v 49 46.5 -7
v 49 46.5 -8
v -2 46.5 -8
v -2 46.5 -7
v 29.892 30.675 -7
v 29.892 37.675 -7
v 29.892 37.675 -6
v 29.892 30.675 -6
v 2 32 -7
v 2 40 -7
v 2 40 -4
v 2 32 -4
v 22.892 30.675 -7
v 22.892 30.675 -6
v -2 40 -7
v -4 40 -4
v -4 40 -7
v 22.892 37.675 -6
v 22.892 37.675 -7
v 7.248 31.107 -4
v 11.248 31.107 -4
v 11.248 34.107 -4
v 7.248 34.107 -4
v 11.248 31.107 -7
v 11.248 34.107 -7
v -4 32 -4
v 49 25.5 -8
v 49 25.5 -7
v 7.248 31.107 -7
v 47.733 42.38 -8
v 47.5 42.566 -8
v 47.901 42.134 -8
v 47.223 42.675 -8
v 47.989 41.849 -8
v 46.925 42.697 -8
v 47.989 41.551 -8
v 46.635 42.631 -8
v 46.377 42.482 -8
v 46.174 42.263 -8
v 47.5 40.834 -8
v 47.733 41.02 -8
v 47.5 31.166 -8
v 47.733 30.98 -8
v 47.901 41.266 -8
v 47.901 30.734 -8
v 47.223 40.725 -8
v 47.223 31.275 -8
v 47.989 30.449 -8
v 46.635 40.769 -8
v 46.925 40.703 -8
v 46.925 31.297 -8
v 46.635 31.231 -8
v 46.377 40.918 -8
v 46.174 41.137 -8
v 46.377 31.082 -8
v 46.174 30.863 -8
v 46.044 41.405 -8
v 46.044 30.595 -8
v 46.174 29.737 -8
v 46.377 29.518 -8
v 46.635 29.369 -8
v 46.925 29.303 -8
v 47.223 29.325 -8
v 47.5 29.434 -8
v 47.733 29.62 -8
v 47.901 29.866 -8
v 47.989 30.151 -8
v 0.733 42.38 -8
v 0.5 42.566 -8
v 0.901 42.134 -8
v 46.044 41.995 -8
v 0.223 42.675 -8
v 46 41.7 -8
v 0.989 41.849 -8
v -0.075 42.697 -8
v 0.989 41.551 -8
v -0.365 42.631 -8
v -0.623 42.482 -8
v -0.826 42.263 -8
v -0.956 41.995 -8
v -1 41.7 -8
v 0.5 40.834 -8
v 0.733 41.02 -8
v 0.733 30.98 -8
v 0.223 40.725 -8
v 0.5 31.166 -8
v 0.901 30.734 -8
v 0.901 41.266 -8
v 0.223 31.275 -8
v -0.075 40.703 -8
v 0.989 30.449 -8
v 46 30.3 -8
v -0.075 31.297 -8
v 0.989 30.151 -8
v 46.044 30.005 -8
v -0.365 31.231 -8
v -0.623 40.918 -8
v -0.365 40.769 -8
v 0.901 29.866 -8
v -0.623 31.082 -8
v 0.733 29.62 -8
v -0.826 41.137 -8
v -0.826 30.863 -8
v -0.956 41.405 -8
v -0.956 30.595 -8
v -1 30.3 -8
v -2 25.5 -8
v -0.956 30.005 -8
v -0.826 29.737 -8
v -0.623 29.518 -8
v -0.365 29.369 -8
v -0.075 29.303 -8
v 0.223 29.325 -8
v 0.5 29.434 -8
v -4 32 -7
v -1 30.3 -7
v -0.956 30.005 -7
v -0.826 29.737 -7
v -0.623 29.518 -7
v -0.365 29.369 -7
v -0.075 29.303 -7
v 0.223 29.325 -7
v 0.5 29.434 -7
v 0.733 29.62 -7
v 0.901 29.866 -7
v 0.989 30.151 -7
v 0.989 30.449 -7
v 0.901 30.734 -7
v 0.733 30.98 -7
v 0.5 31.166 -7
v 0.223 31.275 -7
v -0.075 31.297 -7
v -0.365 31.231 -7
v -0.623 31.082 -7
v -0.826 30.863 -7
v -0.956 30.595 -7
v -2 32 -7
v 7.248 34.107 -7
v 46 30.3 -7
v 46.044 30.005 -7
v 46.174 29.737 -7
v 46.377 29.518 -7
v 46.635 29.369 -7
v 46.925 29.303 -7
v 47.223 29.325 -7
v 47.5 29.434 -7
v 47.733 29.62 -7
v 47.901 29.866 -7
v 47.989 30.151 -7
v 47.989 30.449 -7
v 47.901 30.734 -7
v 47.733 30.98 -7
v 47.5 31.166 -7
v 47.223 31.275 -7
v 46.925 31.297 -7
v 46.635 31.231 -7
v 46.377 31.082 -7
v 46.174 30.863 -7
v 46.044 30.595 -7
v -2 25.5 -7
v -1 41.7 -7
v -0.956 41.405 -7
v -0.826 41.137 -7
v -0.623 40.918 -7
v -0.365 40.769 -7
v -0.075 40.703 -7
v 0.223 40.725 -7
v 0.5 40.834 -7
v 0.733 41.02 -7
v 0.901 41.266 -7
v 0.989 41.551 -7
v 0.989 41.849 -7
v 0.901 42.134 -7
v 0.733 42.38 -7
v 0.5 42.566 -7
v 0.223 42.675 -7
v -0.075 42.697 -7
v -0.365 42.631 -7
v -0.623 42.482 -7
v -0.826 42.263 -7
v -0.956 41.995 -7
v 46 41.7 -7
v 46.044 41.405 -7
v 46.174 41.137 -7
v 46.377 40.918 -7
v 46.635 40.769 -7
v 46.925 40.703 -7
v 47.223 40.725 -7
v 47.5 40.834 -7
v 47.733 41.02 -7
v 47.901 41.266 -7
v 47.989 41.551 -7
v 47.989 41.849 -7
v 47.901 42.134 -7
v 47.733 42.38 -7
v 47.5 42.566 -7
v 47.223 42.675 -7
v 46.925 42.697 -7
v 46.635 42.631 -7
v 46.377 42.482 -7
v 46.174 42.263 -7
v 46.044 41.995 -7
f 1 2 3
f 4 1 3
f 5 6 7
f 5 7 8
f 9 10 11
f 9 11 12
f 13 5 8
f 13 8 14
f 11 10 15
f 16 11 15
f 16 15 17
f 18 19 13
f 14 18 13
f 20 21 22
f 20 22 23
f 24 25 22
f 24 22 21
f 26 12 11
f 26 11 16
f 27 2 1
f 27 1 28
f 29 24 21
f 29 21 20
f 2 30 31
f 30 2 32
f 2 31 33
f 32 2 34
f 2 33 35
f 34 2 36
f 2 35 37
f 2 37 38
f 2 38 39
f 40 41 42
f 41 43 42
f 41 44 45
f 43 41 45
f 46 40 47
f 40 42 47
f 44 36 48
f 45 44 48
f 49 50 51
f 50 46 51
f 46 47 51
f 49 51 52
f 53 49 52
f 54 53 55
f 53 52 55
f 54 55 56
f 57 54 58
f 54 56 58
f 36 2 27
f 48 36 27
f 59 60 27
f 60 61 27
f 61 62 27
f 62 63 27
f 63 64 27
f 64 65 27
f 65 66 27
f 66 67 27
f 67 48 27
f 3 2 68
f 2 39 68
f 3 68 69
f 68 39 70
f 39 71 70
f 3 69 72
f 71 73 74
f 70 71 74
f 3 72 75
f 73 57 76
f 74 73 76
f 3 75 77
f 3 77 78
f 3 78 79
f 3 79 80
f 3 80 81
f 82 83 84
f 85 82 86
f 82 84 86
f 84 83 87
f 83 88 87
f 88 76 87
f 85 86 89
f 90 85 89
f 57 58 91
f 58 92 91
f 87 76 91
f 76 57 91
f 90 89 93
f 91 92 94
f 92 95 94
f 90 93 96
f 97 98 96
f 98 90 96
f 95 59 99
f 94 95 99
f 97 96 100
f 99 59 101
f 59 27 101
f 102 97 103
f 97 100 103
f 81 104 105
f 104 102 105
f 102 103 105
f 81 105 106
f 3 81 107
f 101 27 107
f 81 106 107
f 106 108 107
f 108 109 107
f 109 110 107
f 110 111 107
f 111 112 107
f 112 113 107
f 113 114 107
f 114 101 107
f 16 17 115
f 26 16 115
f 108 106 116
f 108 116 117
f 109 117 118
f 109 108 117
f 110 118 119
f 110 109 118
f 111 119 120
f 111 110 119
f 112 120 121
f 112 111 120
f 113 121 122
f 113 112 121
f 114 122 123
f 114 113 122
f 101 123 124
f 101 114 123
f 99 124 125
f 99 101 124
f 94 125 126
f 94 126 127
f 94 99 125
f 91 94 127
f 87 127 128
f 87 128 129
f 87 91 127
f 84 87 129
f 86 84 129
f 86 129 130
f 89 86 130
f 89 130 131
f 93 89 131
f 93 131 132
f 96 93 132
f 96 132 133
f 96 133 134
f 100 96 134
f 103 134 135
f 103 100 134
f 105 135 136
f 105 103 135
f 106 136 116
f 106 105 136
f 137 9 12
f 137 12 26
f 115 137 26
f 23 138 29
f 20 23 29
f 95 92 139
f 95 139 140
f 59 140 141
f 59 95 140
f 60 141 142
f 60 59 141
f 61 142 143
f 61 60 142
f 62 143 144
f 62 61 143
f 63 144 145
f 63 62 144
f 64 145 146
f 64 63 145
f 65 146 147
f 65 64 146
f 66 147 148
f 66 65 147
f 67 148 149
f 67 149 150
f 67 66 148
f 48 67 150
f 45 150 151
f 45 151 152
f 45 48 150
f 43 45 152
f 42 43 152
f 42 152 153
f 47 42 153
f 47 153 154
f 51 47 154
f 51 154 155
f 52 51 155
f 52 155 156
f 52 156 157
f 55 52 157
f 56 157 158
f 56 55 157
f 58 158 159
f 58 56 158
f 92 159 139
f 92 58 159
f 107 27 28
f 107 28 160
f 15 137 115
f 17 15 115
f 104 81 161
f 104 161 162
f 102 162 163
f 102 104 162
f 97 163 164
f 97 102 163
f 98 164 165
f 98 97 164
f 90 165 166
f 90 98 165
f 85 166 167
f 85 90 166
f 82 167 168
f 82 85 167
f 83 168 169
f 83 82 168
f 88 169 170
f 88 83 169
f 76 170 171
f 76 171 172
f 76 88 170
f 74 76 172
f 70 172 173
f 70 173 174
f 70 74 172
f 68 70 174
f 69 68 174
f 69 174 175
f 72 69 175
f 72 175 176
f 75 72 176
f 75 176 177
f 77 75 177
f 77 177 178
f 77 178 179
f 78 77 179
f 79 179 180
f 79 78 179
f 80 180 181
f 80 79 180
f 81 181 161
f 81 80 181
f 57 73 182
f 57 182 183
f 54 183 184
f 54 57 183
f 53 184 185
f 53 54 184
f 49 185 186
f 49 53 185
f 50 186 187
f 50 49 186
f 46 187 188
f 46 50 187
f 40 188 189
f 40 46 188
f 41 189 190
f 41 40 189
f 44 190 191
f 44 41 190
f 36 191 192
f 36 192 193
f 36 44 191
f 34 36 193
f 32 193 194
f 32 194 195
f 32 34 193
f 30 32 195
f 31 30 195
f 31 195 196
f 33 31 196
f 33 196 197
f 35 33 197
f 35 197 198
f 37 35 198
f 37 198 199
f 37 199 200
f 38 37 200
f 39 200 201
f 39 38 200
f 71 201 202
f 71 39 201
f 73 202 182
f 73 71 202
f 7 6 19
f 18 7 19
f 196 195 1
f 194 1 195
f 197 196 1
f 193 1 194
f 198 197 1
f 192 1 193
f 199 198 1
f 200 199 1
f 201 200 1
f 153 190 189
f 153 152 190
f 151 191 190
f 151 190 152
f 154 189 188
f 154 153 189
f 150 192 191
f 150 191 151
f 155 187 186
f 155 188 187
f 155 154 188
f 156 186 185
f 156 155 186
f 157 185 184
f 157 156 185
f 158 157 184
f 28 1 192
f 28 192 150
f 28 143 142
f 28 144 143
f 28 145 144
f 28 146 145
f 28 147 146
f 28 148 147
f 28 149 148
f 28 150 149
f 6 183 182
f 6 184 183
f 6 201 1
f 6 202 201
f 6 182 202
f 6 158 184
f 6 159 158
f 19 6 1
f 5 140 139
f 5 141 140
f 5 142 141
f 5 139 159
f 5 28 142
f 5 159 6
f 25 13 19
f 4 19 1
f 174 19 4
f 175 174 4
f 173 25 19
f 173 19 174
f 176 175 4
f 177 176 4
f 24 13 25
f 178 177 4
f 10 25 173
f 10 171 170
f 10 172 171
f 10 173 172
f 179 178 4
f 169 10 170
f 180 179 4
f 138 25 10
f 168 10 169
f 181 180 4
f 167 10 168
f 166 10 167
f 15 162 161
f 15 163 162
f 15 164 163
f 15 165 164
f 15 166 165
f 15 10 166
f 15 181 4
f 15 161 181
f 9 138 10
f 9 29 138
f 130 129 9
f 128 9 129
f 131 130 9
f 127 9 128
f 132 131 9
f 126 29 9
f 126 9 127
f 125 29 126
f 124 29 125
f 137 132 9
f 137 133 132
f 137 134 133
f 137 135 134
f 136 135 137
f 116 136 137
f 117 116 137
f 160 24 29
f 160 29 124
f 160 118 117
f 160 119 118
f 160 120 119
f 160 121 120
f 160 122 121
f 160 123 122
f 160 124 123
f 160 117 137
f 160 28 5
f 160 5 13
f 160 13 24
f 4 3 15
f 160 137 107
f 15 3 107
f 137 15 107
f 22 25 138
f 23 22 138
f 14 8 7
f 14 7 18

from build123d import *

# Parameters (mm, degrees)
SKETCH004_W             = 51
SKETCH004_H             = 21
SKETCH004_R             = 1
PAD003_DEPTH            = 1
SKETCH005_W             = 6
SKETCH005_H             = 8
SKETCH005_W_2           = 4
SKETCH005_H_2           = 3
PAD004_DEPTH            = 3
SKETCH006_W             = 7
SKETCH006_H             = 7
PAD005_DEPTH            = 1
BODY001_PLACEMENT_ANGLE = 180


with BuildPart() as part:
    # Sketch004 → Pad003 (new body)
    with BuildSketch(Plane.XY):
        with Locations((-25.5, 10.5)):
            Rectangle(SKETCH004_W, SKETCH004_H)
        with Locations((-49, 16.2)):
            Circle(SKETCH004_R, mode=Mode.SUBTRACT)
        with Locations((-49, 4.8)):
            Circle(SKETCH004_R, mode=Mode.SUBTRACT)
        with Locations((-2, 16.2)):
            Circle(SKETCH004_R, mode=Mode.SUBTRACT)
        with Locations((-2, 4.8)):
            Circle(SKETCH004_R, mode=Mode.SUBTRACT)
    extrude(amount=PAD003_DEPTH)

    # Sketch005 (on Face10 of Pad003) → Pad004 (join)
    with BuildSketch(Plane.XY.offset(1)):
        with Locations((-1, 10.5)):
            Rectangle(SKETCH005_W, SKETCH005_H)
        with Locations((-11.248037, 13.892912)):
            Rectangle(SKETCH005_W_2, SKETCH005_H_2)
    extrude(amount=PAD004_DEPTH)

    # Sketch006 (on Face5 of Pad004) → Pad005 (join)
    with BuildSketch(Plane.XY.offset(1)):
        with Locations((-28.391885, 12.32462)):
            Rectangle(SKETCH006_W, SKETCH006_H)
    extrude(amount=PAD005_DEPTH)


with BuildPart() as part_1:
    # Body001 placement: moved
    add(part.part.moved(Location((-2, 46.5, -8))).rotate(Axis((-2, 46.5, -8), (0, 0, 1)), BODY001_PLACEMENT_ANGLE))


solid = part_1.part
